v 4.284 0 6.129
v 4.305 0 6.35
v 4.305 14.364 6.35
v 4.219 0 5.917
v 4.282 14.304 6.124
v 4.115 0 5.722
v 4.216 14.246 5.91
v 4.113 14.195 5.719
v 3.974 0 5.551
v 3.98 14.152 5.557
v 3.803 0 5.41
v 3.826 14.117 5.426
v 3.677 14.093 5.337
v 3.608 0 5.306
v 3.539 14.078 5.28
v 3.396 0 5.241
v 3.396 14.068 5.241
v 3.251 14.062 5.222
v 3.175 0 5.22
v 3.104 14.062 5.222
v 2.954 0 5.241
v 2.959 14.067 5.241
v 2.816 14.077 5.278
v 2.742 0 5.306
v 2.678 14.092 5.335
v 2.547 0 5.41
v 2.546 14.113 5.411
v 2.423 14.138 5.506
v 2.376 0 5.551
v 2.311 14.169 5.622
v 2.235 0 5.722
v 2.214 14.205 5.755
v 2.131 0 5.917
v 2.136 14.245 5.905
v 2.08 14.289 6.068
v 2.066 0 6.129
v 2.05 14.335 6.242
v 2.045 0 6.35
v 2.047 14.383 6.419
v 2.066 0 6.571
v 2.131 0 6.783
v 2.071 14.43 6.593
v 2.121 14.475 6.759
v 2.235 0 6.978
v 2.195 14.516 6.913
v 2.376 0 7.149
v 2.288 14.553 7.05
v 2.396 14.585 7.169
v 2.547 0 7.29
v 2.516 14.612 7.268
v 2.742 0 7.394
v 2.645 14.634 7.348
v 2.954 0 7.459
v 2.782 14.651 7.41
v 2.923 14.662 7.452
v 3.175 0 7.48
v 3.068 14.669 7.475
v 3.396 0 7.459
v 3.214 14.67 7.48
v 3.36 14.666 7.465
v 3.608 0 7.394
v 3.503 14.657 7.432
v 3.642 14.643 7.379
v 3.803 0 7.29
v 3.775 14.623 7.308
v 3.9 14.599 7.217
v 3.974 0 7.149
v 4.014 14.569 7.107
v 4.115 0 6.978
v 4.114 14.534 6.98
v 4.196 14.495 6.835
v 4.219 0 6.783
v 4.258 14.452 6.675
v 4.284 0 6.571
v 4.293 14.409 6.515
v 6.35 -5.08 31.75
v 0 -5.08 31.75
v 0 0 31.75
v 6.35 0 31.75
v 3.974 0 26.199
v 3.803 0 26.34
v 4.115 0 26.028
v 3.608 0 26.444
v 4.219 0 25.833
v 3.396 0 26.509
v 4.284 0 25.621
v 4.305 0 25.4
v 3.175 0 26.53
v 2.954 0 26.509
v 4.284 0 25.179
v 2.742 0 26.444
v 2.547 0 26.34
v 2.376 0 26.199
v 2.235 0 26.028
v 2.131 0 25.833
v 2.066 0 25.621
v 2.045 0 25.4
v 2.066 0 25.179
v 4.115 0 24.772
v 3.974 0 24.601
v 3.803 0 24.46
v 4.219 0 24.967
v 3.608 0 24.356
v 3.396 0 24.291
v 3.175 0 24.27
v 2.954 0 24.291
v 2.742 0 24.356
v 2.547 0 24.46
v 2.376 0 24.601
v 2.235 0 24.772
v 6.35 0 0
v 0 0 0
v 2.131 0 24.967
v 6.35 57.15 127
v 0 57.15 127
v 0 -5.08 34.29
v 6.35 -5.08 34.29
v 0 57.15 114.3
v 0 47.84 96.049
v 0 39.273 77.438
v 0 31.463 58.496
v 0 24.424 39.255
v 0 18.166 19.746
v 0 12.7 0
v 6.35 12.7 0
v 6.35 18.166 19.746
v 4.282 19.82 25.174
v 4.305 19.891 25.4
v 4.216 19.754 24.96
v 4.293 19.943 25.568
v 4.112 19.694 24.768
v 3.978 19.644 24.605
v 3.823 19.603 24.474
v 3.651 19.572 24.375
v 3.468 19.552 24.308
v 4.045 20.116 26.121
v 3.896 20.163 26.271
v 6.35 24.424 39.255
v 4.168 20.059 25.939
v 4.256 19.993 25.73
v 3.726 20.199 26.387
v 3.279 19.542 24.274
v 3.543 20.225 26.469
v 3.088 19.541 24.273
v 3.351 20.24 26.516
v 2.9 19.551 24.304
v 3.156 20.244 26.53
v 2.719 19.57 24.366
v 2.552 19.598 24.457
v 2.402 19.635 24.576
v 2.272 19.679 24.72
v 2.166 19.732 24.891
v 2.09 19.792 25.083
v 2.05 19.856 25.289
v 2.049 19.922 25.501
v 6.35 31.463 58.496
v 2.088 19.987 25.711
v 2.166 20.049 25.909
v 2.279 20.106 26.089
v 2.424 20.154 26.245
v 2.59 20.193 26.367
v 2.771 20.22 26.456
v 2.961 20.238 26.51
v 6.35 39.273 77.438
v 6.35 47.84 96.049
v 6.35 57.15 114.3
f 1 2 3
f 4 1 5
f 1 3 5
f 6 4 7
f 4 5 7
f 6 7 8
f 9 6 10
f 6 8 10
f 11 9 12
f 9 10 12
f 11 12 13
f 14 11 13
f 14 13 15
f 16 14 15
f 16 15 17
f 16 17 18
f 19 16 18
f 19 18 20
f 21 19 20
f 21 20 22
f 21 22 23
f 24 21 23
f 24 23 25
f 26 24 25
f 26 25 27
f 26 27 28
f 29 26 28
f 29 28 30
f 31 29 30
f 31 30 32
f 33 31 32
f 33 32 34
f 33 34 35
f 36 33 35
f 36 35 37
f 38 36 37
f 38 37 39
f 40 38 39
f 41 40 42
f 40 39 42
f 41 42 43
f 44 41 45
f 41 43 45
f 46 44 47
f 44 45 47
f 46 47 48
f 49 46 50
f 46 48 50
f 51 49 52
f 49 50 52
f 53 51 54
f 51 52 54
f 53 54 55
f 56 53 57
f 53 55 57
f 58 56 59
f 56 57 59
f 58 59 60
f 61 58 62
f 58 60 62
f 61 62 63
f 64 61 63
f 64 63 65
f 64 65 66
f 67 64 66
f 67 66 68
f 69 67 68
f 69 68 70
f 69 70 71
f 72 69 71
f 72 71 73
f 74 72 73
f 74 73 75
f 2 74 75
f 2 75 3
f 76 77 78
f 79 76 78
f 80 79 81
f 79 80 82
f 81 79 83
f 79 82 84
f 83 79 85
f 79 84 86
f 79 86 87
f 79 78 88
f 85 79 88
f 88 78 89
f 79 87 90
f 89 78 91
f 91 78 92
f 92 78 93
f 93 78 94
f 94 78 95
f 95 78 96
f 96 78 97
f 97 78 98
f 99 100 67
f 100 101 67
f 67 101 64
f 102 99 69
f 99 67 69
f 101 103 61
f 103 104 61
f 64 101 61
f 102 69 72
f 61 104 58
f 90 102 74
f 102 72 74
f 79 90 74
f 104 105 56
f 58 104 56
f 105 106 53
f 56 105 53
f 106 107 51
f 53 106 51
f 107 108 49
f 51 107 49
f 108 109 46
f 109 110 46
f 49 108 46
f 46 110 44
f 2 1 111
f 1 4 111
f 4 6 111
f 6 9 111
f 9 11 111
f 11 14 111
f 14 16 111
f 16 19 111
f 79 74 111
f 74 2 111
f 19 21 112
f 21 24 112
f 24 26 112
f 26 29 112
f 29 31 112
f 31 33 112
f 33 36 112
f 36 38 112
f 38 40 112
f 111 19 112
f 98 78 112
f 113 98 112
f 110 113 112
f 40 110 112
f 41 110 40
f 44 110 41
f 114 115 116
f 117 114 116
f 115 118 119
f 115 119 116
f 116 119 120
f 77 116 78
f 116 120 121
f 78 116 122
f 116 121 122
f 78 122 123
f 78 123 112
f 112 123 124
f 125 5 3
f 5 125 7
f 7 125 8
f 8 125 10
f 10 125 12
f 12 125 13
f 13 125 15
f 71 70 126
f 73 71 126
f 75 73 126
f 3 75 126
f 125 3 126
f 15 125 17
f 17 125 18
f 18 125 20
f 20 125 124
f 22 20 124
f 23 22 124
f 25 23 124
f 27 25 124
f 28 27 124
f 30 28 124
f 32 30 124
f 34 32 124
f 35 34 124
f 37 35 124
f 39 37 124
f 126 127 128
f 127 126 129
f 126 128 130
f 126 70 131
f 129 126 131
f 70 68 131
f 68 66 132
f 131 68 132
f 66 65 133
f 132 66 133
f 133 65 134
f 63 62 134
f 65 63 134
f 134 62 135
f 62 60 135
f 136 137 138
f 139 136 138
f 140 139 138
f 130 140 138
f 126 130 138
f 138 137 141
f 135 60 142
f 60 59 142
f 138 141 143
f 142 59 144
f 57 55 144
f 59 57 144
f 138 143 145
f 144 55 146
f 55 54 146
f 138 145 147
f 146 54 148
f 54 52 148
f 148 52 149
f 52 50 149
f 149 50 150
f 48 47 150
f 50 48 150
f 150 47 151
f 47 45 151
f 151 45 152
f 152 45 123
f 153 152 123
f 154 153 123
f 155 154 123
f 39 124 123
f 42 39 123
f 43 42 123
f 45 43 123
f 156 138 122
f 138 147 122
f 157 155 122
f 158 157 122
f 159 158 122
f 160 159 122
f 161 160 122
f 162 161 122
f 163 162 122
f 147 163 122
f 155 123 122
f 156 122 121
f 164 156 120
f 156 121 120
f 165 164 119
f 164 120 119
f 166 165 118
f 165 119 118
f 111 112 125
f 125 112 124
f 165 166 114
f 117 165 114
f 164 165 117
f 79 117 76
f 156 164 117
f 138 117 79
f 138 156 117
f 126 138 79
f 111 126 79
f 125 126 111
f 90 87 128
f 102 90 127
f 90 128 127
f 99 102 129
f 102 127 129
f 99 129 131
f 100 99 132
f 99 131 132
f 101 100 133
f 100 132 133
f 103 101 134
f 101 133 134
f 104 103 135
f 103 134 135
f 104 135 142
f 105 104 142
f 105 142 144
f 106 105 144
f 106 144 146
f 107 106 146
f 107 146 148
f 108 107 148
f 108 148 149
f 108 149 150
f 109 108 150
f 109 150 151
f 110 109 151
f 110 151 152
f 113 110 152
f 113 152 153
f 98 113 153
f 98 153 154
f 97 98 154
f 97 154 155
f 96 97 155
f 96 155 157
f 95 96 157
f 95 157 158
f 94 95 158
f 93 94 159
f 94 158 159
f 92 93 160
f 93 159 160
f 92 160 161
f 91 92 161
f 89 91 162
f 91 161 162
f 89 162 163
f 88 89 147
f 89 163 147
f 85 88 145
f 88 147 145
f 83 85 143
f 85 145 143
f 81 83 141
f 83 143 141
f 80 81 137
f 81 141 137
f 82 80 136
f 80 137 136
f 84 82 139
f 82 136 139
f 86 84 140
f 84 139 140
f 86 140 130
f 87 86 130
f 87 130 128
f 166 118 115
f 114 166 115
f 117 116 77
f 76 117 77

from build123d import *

# Parameters (mm, degrees)
BOSS_EXTRUDE1_DEPTH   = 6.35
F_4_40_TAPPED_HOLE1_D = 2.2606


with BuildPart() as part:
    # Sketch1 → Boss-Extrude1 (new body)
    with BuildSketch(Plane(origin=(0, 0, 0), x_dir=(0, 0, -1), z_dir=(1, 0, 0))):
        with BuildLine():
            Line((0, 0), (0, 12.7))
            ThreePointArc((0, 12.7), (-58.496284585, 31.463125354), (-114.3, 57.15))
            Line((-114.3, 57.15), (-127, 57.15))
            Line((-127, 57.15), (-34.29, -5.08))
            Line((-34.29, -5.08), (-31.75, -5.08))
            Line((-31.75, -5.08), (-31.75, 0))
            Line((-31.75, 0), (0, 0))
        make_face()
    extrude(amount=BOSS_EXTRUDE1_DEPTH)

    # #4-40 Tapped Hole1 (through all)
    with Locations(Plane(origin=(0, 0, 0), x_dir=(-1, 0, 0), z_dir=(0, -1, 0))):
        with Locations((-3.175, -25.4), (-3.175, -6.35)):
            Hole(F_4_40_TAPPED_HOLE1_D / 2)


solid = part.part
